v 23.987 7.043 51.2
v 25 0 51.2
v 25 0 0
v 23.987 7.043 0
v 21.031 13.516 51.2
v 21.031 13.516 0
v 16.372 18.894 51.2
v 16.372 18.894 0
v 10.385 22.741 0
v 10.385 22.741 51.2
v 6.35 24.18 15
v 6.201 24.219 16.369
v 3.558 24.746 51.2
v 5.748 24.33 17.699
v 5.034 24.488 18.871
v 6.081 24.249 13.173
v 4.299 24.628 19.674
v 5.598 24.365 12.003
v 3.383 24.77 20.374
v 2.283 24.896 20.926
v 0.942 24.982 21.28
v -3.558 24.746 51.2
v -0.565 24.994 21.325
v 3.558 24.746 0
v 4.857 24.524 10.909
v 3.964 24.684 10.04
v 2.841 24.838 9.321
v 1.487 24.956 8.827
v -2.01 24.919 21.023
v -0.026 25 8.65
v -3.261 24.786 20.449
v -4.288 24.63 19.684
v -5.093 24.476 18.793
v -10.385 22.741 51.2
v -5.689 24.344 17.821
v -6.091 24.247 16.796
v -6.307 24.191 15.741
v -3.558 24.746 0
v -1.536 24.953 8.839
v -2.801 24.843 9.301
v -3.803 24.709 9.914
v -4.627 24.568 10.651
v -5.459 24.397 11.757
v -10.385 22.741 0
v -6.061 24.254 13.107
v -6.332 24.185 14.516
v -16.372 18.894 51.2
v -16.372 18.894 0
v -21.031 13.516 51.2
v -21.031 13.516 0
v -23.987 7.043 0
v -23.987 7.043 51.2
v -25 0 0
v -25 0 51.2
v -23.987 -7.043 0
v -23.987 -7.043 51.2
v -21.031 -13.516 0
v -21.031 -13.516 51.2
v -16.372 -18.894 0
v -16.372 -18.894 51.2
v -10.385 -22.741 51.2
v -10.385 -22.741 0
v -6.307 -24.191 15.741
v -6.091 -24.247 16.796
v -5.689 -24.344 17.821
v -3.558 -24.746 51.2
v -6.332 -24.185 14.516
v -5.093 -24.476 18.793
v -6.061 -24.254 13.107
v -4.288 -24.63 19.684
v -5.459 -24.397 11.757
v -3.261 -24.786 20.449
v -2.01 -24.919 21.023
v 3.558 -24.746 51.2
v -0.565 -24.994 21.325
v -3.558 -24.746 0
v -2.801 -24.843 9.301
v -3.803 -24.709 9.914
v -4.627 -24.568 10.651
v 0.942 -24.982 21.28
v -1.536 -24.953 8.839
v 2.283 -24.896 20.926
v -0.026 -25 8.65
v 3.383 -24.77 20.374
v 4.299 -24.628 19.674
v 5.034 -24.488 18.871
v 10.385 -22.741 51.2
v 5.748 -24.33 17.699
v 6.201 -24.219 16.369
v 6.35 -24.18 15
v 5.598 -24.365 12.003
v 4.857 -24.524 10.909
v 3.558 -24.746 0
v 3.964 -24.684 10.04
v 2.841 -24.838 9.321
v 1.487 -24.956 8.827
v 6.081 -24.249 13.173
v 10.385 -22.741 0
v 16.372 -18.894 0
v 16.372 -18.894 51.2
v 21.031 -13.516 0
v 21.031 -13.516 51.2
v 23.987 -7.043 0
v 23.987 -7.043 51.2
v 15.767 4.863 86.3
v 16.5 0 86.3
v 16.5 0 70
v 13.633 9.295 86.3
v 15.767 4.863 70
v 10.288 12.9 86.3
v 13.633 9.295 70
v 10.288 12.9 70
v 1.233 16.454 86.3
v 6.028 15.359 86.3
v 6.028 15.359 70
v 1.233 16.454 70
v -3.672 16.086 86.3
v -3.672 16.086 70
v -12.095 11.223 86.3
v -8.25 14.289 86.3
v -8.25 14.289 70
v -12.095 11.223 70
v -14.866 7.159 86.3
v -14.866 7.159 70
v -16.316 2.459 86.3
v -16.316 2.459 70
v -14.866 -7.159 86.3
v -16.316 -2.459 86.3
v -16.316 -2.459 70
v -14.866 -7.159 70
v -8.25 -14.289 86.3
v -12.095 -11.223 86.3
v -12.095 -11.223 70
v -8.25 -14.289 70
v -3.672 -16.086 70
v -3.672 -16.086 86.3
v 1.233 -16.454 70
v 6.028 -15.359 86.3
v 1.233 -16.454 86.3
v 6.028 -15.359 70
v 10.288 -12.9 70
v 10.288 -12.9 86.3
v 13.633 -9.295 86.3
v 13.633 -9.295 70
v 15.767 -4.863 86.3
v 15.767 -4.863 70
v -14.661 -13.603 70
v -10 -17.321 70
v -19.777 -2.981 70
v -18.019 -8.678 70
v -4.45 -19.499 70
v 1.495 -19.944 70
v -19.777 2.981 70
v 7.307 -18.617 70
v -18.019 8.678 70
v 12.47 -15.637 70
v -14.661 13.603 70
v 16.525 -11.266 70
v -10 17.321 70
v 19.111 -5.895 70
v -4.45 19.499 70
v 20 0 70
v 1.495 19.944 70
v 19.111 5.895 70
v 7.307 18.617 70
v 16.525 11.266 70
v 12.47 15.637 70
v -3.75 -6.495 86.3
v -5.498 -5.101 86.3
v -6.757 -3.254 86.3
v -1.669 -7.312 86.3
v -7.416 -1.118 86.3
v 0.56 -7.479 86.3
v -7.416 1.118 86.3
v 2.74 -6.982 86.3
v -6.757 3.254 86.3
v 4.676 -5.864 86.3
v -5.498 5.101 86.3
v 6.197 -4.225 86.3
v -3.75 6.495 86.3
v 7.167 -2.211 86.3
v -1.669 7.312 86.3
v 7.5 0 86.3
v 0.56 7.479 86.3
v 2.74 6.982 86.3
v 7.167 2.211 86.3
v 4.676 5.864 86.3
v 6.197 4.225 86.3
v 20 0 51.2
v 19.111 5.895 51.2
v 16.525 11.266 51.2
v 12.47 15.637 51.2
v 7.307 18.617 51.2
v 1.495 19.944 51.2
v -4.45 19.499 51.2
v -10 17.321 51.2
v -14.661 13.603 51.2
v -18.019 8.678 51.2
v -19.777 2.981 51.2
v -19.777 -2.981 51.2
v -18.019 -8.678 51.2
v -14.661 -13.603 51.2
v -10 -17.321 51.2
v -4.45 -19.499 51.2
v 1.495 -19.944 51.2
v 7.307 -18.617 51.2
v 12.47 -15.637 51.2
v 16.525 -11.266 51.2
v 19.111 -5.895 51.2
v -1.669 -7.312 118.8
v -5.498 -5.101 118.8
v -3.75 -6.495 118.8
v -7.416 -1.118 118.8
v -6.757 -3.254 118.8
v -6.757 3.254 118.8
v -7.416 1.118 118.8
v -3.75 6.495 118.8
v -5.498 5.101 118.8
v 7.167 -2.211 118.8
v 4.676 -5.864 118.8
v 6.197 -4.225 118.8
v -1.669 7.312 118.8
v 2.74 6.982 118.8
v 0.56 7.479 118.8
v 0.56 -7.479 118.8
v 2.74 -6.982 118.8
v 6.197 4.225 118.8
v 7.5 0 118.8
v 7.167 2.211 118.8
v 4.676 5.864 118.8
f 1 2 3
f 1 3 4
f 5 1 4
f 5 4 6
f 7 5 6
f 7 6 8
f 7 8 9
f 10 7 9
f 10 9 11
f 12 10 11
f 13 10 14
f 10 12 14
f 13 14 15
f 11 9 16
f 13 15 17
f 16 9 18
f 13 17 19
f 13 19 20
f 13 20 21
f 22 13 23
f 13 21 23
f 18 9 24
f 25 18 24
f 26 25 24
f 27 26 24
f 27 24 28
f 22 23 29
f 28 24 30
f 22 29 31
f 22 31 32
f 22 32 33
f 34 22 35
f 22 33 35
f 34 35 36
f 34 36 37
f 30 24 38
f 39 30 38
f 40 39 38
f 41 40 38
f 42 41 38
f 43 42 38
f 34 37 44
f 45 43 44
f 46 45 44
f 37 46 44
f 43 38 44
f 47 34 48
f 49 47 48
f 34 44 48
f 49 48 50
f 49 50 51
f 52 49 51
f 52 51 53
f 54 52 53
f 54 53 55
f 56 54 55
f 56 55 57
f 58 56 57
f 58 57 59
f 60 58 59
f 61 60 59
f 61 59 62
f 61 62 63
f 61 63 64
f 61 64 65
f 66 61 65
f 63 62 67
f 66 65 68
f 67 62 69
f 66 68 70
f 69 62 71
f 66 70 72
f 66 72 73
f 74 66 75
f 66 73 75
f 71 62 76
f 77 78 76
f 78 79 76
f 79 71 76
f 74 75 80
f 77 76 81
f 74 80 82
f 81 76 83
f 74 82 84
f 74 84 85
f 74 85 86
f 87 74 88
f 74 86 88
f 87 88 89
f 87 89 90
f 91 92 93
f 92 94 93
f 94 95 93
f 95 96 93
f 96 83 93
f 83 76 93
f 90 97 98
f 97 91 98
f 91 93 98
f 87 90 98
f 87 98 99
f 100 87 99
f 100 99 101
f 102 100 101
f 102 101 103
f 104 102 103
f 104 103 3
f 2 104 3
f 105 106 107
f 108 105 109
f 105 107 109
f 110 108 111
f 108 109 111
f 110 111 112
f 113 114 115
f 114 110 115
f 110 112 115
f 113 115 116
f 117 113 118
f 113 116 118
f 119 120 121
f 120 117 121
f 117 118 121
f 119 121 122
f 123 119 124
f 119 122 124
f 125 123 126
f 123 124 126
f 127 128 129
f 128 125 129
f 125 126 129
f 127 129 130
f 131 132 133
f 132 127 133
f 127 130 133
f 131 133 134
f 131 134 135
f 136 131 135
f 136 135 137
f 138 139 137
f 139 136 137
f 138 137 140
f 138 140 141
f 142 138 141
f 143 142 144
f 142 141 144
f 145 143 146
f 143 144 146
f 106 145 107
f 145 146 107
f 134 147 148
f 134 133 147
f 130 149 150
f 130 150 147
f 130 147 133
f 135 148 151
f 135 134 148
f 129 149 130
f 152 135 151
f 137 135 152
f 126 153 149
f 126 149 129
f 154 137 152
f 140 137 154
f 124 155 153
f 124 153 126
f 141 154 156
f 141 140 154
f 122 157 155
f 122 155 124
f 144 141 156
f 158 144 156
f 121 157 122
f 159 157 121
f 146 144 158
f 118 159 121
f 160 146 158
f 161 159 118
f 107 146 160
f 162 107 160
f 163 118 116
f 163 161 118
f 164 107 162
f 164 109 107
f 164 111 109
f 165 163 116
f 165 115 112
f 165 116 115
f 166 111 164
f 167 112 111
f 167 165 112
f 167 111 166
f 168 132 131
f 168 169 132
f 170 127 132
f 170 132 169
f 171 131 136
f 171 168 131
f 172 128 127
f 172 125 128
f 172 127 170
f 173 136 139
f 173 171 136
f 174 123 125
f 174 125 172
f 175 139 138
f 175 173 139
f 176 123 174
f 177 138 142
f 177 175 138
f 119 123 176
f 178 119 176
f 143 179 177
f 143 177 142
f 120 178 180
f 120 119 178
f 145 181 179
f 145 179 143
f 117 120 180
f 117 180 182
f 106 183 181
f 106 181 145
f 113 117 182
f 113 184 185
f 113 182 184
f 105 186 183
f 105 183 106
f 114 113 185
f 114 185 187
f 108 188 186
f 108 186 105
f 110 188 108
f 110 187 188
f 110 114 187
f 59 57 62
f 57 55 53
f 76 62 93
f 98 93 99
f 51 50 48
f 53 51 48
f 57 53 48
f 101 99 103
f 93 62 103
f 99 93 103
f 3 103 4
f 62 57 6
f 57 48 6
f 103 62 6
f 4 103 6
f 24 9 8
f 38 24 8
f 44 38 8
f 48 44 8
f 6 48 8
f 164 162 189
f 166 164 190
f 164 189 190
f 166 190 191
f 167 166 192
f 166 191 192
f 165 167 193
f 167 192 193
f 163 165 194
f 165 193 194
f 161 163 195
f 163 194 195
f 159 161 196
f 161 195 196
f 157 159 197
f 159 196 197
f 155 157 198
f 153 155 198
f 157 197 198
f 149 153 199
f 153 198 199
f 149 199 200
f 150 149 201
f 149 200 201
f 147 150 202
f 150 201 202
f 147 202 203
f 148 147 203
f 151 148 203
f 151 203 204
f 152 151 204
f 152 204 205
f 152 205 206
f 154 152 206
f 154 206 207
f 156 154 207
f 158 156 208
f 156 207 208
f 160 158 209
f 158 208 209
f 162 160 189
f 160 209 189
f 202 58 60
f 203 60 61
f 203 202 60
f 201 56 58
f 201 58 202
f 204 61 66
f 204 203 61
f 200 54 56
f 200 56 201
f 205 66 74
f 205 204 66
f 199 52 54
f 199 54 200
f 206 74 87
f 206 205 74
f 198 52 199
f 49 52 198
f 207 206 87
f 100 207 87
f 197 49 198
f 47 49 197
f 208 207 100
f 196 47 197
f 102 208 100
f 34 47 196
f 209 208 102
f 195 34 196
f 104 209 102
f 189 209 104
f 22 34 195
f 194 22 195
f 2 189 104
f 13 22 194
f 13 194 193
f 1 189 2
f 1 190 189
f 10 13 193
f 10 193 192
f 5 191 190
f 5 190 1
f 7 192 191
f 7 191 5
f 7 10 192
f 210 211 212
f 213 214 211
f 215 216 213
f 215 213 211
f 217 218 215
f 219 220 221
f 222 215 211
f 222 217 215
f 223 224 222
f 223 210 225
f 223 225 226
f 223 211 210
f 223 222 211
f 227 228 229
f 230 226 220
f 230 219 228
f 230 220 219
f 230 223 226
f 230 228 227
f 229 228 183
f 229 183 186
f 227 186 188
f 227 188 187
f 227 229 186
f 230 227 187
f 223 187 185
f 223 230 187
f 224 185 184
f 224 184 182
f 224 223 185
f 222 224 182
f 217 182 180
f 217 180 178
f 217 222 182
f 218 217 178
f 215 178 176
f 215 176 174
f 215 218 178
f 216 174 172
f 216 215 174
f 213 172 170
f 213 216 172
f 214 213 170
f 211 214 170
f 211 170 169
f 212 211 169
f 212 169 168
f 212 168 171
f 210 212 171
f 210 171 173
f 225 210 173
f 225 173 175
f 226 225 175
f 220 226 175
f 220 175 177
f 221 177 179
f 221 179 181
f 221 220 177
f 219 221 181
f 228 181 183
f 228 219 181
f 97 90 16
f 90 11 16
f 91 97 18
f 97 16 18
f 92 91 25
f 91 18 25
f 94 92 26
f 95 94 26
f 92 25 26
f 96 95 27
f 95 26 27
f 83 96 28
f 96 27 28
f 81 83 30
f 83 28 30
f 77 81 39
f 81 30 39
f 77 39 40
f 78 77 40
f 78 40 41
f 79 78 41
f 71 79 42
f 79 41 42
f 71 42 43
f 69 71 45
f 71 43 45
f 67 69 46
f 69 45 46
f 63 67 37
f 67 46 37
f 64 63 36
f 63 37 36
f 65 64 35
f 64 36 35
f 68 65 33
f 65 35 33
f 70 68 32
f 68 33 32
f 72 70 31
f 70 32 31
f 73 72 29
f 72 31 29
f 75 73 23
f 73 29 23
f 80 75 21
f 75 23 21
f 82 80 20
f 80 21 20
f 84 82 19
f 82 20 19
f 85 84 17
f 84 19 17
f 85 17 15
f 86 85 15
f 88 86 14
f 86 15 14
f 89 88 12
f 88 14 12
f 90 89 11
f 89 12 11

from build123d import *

# Parameters (mm, degrees)
ESQUISSE1_R                  = 25
BOSS_EXTRU_1_DEPTH           = 51.2
ESQUISSE2_R                  = 20
BOSS_EXTRU_2_DEPTH           = 18.8
ESQUISSE3_R                  = 16.5
BOSS_EXTRU_3_DEPTH           = 16.7
ESQUISSE4_R                  = 27.5
BOSS_EXTRU_4_DEPTH           = 47.1
CHANFREIN1_SIZE              = 10
CHANFREIN1_SIZE2             = 17.320508076
ESQUISSE12_R                 = 6.35
ENL_V_MAT_EXTRU_1_DEPTH      = 28.5
ENL_V_MAT_EXTRU_1_DEPTH_BACK = 28.5
ESQUISSE13_R                 = 47.258439022
ENL_V_MAT_EXTRU_2_DEPTH      = 15
ESQUISSE14_R                 = 39.934727028
ESQUISSE14_R_2               = 7.5
ENL_V_MAT_EXTRU_4_DEPTH      = 32.5


with BuildPart() as part:
    # Esquisse1 → Boss.-Extru.1 (new body)
    with BuildSketch(Plane.XY):
        Circle(ESQUISSE1_R)
    extrude(amount=BOSS_EXTRU_1_DEPTH)

    # Esquisse2 → Boss.-Extru.2 (add)
    with BuildSketch(Plane.XY.offset(51.2)):
        Circle(ESQUISSE2_R)
    extrude(amount=BOSS_EXTRU_2_DEPTH)

    # Esquisse3 → Boss.-Extru.3 (add)
    with BuildSketch(Plane.XY.offset(70)):
        Circle(ESQUISSE3_R)
    extrude(amount=BOSS_EXTRU_3_DEPTH)

    # Esquisse4 → Boss.-Extru.4 (add)
    with BuildSketch(Plane.XY.offset(86.7)):
        Circle(ESQUISSE4_R)
    extrude(amount=BOSS_EXTRU_4_DEPTH)

    # Chanfrein1
    chanfrein1_edges = [part.edges().sort_by_distance(p)[0] for p in [
        (-27.5, 0, 86.7),
    ]]
    chanfrein1_side = [part.faces().sort_by_distance(p)[0] for p in [
        (-26.722182541, 0, 86.7),
    ]]
    chamfer(chanfrein1_edges, length=CHANFREIN1_SIZE, length2=CHANFREIN1_SIZE2, reference=chanfrein1_side[0])

    # Esquisse12 → Enlèv. mat.-Extru.1 (cut, two sides)
    with BuildSketch(Plane(origin=(0, 0, 0), x_dir=(1, 0, 0), z_dir=(0, 1, 0))) as enl_v_mat_extru_1_sk:
        with Locations((0, -15)):
            Circle(ESQUISSE12_R)
    extrude(amount=ENL_V_MAT_EXTRU_1_DEPTH, mode=Mode.SUBTRACT)
    extrude(enl_v_mat_extru_1_sk.sketch, amount=-ENL_V_MAT_EXTRU_1_DEPTH_BACK, mode=Mode.SUBTRACT)

    # Esquisse13 → Enlèv. mat.-Extru.2 (cut)
    with BuildSketch(Plane.XY.offset(133.8)):
        with Locations((0.544033406, 0)):
            Circle(ESQUISSE13_R)
    extrude(amount=-ENL_V_MAT_EXTRU_2_DEPTH, mode=Mode.SUBTRACT)

    # Esquisse14 → Enlèv. mat.-Extru.4 (cut)
    with BuildSketch(Plane.XY.offset(118.8)):
        Circle(ESQUISSE14_R)
        Circle(ESQUISSE14_R_2, mode=Mode.SUBTRACT)
    extrude(amount=-ENL_V_MAT_EXTRU_4_DEPTH, mode=Mode.SUBTRACT)


solid = part.part
